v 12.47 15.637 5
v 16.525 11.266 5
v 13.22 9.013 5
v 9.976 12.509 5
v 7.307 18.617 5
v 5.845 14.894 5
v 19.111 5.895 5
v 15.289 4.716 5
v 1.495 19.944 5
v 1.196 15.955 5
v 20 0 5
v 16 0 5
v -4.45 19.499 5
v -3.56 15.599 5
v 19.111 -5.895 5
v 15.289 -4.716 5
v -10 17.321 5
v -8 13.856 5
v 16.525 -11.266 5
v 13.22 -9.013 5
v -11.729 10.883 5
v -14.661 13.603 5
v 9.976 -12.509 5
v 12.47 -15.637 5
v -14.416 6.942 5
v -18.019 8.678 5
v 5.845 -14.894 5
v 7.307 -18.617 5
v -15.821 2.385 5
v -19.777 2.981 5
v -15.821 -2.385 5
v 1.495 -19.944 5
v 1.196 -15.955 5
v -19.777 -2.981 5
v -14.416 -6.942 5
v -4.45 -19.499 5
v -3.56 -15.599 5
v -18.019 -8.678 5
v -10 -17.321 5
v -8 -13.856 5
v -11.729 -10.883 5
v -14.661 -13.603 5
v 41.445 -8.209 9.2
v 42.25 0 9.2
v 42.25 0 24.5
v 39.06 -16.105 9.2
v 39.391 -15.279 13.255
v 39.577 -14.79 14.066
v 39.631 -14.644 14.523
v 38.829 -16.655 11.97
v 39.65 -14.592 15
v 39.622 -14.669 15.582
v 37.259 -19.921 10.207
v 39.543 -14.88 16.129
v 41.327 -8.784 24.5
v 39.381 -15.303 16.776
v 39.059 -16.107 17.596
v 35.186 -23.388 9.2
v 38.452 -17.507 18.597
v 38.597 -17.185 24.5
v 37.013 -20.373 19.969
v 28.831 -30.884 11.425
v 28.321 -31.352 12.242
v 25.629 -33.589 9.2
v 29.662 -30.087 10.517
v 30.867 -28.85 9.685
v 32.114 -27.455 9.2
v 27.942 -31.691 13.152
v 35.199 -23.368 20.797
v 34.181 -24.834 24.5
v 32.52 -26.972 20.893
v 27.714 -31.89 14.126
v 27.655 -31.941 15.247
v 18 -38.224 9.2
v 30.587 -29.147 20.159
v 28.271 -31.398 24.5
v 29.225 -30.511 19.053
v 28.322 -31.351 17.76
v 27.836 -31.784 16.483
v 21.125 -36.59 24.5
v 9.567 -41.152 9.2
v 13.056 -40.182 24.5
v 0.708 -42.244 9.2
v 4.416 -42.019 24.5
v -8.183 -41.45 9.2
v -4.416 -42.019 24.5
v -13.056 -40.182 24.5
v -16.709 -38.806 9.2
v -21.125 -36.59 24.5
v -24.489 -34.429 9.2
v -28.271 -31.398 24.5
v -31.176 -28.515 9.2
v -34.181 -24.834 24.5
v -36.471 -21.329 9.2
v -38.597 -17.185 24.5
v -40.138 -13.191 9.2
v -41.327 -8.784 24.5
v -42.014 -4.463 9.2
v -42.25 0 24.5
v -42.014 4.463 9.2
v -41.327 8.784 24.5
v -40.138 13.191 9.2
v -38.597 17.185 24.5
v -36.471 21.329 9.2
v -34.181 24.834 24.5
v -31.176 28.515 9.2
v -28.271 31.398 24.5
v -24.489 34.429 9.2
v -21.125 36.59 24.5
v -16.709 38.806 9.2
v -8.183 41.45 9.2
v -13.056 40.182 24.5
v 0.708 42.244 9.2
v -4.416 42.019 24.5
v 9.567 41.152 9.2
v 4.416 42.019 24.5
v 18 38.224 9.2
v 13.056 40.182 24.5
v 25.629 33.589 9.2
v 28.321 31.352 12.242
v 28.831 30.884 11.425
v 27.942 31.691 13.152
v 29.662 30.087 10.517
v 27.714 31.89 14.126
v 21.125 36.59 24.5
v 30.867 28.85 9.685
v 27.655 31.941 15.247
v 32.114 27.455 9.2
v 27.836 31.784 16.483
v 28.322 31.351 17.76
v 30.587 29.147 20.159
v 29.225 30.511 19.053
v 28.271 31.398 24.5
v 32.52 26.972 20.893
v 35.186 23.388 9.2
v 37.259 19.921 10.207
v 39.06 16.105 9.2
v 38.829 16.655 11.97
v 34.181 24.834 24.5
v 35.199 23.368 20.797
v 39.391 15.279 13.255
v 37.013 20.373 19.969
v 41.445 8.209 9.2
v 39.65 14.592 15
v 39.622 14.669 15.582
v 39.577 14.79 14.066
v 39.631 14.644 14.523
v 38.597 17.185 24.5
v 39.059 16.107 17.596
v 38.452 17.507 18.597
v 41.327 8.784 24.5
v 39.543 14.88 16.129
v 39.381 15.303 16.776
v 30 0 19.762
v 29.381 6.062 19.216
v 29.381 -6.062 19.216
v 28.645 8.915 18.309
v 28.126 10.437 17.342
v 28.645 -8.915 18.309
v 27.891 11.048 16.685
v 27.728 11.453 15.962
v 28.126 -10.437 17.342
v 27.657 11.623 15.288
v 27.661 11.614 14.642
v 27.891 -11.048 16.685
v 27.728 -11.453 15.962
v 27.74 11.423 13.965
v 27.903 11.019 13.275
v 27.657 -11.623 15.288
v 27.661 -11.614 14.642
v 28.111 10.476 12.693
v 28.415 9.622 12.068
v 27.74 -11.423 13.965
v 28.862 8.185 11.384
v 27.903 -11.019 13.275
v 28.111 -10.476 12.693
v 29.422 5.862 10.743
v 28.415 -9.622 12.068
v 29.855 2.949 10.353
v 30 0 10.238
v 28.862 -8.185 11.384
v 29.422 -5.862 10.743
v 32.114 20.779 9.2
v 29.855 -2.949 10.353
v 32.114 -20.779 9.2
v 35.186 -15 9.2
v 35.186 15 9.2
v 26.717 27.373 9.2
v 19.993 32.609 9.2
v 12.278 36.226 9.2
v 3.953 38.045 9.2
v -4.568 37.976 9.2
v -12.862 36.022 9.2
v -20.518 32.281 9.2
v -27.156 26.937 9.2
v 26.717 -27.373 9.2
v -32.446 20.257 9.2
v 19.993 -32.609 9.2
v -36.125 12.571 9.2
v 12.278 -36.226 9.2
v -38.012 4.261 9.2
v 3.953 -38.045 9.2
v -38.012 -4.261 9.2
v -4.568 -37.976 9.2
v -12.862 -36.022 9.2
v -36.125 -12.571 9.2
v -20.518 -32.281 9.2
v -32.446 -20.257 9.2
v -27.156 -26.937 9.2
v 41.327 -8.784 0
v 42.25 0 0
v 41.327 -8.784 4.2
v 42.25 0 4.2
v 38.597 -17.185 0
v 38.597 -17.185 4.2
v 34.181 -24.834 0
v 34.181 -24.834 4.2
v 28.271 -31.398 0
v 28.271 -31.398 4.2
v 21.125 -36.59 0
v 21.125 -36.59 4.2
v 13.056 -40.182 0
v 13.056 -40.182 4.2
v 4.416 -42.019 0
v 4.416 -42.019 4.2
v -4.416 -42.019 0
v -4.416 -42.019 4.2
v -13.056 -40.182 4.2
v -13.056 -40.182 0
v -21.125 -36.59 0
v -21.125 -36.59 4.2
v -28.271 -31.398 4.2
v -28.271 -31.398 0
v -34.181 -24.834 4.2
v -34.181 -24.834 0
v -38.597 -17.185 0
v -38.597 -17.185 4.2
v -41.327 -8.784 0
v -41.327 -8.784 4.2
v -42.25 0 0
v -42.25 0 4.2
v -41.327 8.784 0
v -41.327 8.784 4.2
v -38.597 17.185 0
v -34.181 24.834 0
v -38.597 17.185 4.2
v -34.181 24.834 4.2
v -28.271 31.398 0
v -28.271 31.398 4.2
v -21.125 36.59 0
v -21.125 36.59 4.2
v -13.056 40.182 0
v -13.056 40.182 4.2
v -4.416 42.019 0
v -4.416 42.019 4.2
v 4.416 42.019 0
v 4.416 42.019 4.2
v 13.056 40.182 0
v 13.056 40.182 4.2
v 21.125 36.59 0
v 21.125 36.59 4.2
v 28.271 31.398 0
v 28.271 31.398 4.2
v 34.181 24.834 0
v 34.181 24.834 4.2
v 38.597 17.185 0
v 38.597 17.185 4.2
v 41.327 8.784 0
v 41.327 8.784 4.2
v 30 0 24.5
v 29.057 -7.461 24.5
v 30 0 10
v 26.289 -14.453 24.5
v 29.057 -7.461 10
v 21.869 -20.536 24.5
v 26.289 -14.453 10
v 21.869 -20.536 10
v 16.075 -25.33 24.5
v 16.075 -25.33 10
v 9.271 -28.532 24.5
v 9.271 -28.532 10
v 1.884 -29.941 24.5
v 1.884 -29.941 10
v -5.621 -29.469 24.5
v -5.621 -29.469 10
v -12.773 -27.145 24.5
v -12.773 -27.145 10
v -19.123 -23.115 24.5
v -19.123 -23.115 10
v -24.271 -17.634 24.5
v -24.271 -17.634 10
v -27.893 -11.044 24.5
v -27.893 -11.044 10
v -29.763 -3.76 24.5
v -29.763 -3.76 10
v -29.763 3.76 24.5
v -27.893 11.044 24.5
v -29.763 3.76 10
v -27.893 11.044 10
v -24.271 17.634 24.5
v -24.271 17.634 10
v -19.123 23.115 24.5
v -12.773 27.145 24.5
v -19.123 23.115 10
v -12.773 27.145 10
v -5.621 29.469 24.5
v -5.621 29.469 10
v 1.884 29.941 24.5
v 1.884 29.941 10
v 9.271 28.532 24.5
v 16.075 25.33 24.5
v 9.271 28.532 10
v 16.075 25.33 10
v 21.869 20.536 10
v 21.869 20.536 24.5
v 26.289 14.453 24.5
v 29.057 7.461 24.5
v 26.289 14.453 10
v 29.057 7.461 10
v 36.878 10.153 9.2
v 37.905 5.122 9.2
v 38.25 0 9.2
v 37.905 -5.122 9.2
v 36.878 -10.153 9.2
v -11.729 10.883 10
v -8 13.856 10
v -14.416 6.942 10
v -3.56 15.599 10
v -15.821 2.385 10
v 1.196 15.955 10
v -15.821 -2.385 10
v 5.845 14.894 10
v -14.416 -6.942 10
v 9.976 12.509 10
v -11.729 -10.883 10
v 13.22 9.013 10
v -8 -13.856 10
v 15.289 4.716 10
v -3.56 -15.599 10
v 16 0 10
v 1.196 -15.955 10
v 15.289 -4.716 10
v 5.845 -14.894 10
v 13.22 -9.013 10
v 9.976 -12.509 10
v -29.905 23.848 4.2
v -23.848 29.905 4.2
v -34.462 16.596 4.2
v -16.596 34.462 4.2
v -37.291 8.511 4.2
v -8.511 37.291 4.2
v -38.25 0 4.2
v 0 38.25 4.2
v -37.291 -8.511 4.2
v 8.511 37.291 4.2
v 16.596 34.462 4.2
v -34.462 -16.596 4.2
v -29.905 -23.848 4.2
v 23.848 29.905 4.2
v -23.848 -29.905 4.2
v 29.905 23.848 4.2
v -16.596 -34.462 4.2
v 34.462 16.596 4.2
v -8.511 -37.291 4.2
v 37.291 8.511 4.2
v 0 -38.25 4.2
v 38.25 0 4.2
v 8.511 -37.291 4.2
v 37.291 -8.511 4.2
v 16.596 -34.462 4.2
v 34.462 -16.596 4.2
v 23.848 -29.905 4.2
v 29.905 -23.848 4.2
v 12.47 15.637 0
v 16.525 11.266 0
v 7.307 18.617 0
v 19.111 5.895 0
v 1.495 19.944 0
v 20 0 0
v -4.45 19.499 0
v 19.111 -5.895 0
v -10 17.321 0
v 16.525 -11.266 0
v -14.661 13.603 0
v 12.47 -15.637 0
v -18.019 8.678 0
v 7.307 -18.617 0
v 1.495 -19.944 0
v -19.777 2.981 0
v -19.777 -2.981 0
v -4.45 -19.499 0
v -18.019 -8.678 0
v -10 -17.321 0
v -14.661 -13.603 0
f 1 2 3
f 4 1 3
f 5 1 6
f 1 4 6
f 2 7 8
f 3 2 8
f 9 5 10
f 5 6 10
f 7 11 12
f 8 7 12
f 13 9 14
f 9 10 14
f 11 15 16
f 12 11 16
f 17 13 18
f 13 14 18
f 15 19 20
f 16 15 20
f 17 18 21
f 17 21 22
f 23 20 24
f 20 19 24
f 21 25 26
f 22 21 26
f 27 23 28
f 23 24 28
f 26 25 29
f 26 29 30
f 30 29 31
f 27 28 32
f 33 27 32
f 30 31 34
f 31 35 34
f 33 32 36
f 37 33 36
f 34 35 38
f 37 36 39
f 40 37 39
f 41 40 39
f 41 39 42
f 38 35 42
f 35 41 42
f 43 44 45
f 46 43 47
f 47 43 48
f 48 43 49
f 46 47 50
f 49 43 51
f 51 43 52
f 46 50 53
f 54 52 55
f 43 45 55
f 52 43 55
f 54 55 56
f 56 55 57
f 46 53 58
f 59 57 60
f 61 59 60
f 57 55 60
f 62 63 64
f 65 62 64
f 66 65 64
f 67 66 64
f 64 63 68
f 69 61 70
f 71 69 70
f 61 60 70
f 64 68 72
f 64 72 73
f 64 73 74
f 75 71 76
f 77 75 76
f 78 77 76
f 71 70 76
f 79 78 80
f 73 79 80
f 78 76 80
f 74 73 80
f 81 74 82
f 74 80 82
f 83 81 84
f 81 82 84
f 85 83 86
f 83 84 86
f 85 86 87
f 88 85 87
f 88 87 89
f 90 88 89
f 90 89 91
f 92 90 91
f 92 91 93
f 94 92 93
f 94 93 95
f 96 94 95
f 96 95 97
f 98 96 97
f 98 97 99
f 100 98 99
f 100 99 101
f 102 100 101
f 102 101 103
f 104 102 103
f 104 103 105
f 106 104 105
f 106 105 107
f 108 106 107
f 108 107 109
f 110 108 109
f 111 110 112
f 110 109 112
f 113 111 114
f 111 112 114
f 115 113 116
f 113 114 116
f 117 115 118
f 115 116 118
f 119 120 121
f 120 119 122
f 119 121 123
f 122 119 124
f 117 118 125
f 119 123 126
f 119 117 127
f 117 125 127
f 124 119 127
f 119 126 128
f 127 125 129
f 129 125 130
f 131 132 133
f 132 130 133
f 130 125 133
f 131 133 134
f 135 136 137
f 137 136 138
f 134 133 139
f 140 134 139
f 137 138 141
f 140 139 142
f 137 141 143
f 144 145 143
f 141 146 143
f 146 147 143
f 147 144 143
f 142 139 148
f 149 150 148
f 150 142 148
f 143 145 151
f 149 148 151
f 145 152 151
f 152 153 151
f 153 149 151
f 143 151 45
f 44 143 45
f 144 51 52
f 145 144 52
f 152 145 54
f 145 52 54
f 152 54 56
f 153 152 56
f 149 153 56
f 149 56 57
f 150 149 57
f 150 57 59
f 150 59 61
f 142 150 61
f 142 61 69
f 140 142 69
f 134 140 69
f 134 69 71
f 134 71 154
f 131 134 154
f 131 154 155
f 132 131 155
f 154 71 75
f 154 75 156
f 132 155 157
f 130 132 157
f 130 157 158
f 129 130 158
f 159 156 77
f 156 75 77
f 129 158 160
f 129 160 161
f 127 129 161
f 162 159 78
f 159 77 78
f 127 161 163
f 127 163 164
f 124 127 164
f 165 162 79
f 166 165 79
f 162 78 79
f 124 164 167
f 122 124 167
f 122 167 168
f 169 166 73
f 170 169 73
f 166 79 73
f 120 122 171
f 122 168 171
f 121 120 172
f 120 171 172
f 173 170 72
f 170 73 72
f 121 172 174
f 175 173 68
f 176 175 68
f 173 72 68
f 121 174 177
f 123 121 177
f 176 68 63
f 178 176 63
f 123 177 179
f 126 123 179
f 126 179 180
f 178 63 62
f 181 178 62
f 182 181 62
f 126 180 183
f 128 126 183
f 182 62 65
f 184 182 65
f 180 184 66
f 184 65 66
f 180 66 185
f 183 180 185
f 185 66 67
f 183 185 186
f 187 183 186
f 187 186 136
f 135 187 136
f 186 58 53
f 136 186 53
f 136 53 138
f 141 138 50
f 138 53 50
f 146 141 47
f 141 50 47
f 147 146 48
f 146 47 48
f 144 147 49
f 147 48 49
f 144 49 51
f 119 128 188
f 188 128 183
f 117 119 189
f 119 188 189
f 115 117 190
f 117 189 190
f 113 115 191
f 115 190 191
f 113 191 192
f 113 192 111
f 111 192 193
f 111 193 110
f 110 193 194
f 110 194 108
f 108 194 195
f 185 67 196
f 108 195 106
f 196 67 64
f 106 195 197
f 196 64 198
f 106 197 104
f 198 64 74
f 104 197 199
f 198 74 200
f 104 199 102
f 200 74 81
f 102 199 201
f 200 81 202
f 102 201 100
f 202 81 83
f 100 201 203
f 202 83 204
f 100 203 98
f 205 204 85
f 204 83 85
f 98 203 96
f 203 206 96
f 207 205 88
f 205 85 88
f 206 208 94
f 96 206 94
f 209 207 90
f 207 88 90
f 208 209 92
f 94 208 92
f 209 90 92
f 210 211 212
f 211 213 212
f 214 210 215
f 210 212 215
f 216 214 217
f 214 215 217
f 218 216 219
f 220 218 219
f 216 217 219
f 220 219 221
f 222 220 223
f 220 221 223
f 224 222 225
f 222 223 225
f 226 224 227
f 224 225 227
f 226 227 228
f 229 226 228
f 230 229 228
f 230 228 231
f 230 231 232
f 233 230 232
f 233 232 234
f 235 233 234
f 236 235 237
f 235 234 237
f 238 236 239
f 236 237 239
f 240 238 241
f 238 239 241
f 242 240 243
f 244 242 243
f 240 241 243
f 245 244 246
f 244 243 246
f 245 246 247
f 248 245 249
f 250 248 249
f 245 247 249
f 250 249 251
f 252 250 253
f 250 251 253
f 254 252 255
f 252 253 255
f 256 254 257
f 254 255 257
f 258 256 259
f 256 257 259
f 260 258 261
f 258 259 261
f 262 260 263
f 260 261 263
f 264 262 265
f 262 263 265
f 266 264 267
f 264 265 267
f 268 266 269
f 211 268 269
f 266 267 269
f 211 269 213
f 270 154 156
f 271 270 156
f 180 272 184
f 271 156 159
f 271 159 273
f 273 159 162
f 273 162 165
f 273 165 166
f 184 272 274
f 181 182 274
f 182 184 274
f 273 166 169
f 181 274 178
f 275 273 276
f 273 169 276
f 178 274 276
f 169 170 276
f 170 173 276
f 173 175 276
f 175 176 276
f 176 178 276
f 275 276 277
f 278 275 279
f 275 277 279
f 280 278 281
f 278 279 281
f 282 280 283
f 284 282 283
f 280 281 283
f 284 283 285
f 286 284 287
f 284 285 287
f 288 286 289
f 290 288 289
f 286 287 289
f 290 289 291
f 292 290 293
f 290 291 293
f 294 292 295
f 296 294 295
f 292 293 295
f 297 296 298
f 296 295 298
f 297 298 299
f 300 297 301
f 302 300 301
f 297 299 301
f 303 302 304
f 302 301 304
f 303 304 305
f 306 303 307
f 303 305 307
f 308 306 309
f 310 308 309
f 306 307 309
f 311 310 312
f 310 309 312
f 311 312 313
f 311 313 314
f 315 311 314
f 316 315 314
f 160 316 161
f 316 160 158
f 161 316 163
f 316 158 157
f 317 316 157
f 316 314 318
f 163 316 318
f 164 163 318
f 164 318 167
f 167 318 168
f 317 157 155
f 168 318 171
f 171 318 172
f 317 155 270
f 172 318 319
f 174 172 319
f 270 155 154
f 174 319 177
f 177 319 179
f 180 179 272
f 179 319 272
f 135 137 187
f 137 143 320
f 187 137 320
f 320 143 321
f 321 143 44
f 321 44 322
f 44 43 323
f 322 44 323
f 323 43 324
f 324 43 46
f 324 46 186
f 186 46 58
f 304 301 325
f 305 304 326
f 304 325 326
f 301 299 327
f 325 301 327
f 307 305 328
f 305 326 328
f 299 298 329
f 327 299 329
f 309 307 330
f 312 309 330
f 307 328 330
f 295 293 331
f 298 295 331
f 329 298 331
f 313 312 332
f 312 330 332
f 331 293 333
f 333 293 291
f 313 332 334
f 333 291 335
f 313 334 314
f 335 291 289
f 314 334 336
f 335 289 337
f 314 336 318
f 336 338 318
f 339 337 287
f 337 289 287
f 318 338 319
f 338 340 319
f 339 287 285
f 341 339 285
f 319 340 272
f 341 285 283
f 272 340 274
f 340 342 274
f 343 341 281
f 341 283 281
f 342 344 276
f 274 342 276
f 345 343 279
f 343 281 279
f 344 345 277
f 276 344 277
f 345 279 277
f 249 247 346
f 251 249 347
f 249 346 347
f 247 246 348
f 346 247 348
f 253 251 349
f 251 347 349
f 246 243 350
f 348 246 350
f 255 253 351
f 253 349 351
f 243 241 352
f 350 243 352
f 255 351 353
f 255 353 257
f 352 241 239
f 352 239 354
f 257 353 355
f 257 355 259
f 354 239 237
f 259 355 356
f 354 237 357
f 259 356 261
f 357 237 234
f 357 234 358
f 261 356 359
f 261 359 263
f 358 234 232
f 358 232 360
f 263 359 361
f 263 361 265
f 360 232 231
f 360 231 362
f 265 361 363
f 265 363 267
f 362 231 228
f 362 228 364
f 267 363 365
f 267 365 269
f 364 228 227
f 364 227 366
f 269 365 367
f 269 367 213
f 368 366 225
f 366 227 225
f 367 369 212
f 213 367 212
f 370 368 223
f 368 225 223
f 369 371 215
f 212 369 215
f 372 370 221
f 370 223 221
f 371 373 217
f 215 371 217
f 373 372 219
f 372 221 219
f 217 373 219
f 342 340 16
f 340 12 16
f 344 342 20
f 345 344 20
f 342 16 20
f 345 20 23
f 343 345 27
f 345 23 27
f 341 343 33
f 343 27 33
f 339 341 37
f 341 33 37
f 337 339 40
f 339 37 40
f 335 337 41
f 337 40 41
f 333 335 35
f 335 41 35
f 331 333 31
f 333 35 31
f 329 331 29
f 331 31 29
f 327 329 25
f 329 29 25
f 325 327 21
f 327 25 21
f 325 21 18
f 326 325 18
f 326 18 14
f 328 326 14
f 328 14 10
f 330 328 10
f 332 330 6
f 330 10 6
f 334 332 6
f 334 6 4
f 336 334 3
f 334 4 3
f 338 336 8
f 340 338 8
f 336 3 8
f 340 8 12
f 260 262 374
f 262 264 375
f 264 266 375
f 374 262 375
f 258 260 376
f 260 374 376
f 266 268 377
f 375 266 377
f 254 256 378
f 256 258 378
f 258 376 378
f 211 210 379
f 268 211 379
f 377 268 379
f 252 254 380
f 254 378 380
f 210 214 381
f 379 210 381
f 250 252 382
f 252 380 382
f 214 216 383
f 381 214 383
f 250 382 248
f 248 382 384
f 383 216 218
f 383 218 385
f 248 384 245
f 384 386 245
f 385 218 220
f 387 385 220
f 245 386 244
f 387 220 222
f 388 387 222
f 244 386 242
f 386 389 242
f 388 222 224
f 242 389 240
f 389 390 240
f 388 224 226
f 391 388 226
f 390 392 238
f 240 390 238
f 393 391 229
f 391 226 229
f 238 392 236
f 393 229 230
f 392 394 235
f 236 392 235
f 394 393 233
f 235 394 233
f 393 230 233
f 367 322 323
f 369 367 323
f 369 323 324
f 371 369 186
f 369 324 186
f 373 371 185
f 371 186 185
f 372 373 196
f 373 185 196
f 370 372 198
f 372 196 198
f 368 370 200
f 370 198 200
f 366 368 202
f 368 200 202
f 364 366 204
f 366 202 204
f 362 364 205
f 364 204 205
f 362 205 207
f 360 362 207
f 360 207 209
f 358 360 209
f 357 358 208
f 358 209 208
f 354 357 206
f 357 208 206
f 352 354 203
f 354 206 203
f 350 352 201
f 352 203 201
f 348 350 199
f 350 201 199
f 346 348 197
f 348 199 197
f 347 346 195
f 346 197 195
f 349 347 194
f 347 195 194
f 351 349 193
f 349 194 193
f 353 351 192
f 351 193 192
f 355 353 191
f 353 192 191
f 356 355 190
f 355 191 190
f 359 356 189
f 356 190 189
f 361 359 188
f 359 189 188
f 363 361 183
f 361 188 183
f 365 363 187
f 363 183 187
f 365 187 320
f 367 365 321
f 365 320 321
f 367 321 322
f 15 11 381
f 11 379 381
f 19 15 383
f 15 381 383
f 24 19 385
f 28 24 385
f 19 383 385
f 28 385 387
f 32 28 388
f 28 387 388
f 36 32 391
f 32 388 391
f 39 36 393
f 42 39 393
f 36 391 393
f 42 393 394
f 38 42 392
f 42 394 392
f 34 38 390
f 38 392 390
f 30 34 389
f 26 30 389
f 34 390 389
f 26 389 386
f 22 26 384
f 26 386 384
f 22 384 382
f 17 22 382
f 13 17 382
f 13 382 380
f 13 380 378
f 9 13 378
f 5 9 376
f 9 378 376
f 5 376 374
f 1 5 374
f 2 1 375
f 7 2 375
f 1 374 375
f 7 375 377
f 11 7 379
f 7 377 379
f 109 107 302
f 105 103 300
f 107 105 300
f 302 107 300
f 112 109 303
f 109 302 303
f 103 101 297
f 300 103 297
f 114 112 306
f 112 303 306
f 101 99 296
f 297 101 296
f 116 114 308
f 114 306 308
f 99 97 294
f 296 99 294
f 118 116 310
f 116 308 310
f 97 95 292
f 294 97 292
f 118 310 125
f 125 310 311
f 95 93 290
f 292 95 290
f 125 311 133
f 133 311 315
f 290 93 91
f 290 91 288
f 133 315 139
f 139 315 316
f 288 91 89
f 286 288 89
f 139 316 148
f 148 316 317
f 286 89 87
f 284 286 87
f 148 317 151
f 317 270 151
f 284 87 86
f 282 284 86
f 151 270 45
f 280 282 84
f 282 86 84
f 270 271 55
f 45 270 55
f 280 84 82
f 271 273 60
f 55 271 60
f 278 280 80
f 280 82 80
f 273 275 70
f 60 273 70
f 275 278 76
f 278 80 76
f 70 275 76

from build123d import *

# Parameters (mm, degrees)
F2_R     = 6
F3_DEPTH = 50


with BuildPart() as f1:
    # F0 (on Front) → F1 (revolve)
    with BuildSketch(Plane.XZ):
        Polygon((20, 5), (20, 0), (42.25, 0), (42.25, 4.2), (38.25, 4.2), (38.25, 9.2), (42.25, 9.2), (42.25, 24.5), (30, 24.5), (30, 10), (16, 10), (16, 5), align=None)
    revolve(axis=Axis((0, 0, 1.3315217948), (0, 0, -1)))


with BuildPart() as f3:
    # F2 (on Front) → F3 (new body, symmetric)
    with BuildSketch(Plane.XZ):
        with Locations((33.65, 15)):
            Circle(F2_R)
    extrude(amount=F3_DEPTH, both=True)


with BuildPart() as f1_1:
    add(f1.part)

    # F4: cut F3
    add(f3.part, mode=Mode.SUBTRACT)


solid = f1_1.part
